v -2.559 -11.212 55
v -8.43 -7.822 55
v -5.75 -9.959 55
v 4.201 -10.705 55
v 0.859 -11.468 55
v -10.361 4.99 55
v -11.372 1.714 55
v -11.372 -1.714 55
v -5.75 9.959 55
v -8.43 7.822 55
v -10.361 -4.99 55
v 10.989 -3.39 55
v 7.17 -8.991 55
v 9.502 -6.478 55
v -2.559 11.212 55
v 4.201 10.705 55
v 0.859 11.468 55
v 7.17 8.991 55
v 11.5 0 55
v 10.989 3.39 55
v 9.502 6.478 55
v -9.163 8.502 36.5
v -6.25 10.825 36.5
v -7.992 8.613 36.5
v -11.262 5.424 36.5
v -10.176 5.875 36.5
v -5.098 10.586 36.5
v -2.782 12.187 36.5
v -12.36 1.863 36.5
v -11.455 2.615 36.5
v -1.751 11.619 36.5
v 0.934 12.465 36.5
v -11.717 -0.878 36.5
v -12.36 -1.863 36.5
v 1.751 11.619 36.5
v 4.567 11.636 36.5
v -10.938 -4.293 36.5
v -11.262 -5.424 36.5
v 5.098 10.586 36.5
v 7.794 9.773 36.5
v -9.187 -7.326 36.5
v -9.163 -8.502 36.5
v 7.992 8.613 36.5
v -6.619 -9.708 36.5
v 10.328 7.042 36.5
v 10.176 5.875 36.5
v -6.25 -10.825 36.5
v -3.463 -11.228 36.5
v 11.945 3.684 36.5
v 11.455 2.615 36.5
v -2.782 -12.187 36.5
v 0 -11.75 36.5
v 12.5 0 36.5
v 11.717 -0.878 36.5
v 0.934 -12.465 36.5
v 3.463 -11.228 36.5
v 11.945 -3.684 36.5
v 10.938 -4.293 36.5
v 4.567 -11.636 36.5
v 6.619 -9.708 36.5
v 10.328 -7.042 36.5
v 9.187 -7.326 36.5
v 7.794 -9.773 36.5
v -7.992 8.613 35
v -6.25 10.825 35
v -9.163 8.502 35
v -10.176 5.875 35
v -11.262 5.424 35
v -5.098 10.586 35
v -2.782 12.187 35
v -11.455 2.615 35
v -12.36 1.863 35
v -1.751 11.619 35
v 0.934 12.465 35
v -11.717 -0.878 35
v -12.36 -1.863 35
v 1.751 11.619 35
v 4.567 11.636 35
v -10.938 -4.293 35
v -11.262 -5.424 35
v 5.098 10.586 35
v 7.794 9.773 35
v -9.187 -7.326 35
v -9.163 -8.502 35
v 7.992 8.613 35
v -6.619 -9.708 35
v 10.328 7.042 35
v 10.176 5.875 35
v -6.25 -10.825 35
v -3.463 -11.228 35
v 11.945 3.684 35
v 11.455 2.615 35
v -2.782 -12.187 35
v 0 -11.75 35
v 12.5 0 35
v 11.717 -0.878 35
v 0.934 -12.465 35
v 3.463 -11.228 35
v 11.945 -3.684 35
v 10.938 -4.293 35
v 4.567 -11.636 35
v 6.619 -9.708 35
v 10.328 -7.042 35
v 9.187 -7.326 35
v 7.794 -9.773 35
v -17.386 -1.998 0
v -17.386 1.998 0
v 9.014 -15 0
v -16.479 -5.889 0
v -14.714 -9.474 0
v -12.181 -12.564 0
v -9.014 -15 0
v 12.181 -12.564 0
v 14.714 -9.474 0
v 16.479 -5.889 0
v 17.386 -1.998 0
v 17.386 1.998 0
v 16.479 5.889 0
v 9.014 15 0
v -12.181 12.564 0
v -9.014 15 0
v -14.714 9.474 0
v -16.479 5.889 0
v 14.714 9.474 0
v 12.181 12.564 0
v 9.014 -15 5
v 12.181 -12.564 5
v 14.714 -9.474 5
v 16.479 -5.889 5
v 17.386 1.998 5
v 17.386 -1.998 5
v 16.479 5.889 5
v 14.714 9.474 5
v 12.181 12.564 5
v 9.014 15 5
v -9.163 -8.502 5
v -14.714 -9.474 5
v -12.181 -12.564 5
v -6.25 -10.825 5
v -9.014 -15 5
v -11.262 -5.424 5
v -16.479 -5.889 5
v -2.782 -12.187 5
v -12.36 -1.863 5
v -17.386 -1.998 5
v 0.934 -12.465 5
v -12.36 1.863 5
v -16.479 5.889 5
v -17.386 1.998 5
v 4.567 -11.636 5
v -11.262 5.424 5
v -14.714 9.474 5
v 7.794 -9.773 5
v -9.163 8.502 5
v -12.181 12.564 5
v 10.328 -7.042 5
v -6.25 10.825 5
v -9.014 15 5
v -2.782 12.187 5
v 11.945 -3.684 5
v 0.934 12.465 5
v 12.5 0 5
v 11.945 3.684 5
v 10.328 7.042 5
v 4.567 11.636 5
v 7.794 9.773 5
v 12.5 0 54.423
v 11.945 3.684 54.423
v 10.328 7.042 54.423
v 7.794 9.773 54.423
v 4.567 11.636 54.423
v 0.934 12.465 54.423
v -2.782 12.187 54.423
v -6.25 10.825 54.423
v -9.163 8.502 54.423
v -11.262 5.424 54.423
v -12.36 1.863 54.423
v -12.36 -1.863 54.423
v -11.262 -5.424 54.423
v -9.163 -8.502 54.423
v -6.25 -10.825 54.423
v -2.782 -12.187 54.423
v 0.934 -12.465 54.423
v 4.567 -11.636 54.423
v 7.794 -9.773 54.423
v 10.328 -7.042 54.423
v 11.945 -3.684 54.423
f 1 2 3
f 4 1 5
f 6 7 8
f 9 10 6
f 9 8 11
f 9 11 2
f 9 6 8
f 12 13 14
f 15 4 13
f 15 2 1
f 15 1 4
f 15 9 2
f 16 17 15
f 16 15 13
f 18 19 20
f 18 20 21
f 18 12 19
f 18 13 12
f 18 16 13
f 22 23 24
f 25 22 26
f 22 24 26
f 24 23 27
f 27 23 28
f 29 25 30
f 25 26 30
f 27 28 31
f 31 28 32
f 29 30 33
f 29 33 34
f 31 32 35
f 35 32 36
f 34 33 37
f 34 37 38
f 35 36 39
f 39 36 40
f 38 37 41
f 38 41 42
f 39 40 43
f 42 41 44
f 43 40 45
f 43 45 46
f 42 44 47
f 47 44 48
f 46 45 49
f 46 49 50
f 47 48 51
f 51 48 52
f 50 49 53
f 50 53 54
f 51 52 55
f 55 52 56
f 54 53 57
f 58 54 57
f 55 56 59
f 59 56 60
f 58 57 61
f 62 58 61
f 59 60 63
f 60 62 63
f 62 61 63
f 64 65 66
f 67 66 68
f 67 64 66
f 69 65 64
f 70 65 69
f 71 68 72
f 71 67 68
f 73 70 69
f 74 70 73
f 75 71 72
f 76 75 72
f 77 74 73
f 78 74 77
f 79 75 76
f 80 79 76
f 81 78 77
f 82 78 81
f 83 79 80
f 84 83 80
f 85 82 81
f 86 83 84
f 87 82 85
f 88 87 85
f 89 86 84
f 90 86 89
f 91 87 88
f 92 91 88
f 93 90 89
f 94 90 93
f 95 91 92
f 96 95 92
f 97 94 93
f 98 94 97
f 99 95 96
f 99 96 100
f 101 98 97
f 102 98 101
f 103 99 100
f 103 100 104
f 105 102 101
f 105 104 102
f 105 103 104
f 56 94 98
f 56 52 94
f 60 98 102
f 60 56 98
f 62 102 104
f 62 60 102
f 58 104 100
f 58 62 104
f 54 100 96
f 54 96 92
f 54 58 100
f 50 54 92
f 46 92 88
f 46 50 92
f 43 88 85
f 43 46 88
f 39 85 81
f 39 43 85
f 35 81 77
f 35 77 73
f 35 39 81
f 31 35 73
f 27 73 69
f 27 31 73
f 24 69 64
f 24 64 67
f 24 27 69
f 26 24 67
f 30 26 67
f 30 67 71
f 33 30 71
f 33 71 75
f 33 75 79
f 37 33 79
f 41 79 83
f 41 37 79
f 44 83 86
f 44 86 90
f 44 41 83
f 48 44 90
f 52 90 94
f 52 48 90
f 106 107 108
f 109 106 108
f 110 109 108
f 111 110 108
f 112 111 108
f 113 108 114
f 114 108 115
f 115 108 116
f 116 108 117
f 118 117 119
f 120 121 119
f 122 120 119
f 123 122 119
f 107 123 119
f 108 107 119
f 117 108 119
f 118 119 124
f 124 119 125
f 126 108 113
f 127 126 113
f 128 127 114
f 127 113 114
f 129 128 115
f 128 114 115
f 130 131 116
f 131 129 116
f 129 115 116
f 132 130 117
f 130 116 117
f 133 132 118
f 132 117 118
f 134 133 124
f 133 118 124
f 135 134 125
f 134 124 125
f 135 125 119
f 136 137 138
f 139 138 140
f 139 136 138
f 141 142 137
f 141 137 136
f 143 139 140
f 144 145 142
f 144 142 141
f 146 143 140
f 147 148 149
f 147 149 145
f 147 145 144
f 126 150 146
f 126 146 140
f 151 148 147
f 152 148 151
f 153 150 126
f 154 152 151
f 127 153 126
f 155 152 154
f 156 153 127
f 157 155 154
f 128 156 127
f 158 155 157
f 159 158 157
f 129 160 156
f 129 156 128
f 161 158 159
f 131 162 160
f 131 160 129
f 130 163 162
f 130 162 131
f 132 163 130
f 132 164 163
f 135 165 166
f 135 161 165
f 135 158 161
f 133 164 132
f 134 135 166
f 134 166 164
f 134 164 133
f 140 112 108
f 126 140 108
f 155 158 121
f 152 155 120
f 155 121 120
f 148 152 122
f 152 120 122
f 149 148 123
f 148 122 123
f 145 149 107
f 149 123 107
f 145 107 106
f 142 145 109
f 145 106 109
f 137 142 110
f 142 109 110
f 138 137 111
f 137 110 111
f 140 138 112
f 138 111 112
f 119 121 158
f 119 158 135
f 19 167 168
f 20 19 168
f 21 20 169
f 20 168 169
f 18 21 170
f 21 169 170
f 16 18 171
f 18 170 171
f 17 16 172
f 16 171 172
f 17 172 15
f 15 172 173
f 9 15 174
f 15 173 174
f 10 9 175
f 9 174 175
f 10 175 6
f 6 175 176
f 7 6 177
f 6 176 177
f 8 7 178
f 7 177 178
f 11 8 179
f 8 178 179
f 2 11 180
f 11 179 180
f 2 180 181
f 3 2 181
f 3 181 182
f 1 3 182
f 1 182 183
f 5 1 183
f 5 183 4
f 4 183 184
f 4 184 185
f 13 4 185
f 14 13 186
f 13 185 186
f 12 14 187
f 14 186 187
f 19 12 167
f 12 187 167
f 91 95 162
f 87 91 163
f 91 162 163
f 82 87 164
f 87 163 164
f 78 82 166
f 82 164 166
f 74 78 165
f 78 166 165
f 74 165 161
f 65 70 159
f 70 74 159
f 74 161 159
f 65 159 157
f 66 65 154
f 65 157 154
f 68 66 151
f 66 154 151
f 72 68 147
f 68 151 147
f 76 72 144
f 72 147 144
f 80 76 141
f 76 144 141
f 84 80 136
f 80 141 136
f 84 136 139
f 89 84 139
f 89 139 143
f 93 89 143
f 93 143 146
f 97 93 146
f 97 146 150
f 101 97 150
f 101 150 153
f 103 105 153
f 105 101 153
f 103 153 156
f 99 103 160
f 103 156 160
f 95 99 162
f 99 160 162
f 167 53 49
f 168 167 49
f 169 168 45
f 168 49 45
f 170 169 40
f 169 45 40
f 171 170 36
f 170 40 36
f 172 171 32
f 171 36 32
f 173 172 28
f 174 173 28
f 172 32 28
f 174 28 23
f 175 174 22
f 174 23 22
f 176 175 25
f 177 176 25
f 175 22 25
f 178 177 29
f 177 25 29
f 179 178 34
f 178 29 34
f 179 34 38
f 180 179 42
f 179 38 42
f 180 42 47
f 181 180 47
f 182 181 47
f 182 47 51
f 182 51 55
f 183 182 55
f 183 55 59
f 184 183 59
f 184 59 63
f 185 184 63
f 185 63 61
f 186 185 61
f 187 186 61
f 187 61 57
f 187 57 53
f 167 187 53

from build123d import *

# Parameters (mm, degrees)
F0_R     = 17.5
F1_DEPTH = 5
F2_R     = 12.5
F3_DEPTH = 50
F4_W     = 55
F4_H     = 40
F4_W_2   = 45
F4_H_2   = 30
F5_DEPTH = 25
F6_W     = 3.4094286376
F6_H     = 1.5
F8_SIZE2 = 0.5773502692
F8_SIZE  = 1


with BuildPart() as f1:
    # F0 (on Top) → F1 (new body)
    with BuildSketch(Plane.XY):
        Circle(F0_R)
    extrude(amount=F1_DEPTH)

    # F2 (on face) → F3 (join)
    with BuildSketch(Plane.XY.offset(5)):
        Circle(F2_R)
    extrude(amount=F3_DEPTH)

    # F4 (on face) → F5 (cut)
    with BuildSketch(Plane(origin=(0, 0, 0), x_dir=(1, 0, 0), z_dir=(0, 0, -1))):
        Rectangle(F4_W, F4_H)
        Rectangle(F4_W_2, F4_H_2, mode=Mode.SUBTRACT)
    extrude(amount=-F5_DEPTH, mode=Mode.SUBTRACT)

    # F6 (on Right) → F7 (revolve, cut)
    with BuildSketch(Plane.YZ):
        with Locations((-13.4547143188, 35.75)):
            Rectangle(F6_W, F6_H)
    revolve(axis=Axis((0, 0, 30.1519706845), (0, 0, 1)), mode=Mode.SUBTRACT)

    # F8
    f8_edges = [f1.edges().sort_by_distance(p)[0] for p in [
        (-12.5, 0, 55),
    ]]
    f8_side = f1.faces().sort_by_distance((0, 0, 55))[0]
    chamfer(f8_edges, length=F8_SIZE, length2=F8_SIZE2, reference=f8_side)


solid = f1.part
